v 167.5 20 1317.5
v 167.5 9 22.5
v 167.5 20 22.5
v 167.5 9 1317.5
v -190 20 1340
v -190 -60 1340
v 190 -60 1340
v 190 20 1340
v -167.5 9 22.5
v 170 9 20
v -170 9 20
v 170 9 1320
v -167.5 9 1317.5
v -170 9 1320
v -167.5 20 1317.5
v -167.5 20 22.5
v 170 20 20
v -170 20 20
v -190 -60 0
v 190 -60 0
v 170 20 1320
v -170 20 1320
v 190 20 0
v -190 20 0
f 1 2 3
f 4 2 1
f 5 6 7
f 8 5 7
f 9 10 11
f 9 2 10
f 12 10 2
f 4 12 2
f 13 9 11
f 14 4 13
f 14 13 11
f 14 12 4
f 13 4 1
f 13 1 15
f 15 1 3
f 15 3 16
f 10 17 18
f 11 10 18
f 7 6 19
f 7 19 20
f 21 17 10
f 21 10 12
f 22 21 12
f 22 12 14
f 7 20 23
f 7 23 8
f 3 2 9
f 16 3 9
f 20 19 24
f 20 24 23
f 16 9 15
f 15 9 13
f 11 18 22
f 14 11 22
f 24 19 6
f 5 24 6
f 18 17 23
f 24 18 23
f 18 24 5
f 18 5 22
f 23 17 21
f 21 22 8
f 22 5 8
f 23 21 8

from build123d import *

# Parameters (mm, degrees)
SKETCH1_W           = 380
SKETCH1_H           = 1340
BOSS_EXTRUDE1_DEPTH = 80
SKETCH2_W           = 340
SKETCH2_H           = 1300
CUT_EXTRUDE1_DEPTH  = 11
SKETCH3_W           = 335
SKETCH3_H           = 1295
BOSS_EXTRUDE2_DEPTH = 11


with BuildPart() as part:
    # Sketch1 → Boss-Extrude1 (new body)
    with BuildSketch(Plane.XZ.offset(60)):
        with Locations((0, 670)):
            Rectangle(SKETCH1_W, SKETCH1_H)
    extrude(amount=-BOSS_EXTRUDE1_DEPTH)

    # Sketch2 → Cut-Extrude1 (cut)
    with BuildSketch(Plane(origin=(0, 20, 0), x_dir=(-1, 0, 0), z_dir=(0, 1, 0))):
        with Locations((0, 670)):
            Rectangle(SKETCH2_W, SKETCH2_H)
    extrude(amount=-CUT_EXTRUDE1_DEPTH, mode=Mode.SUBTRACT)

    # Sketch3 → Boss-Extrude2 (add)
    with BuildSketch(Plane(origin=(0, 9, 0), x_dir=(-1, 0, 0), z_dir=(0, 1, 0))):
        with Locations((0, 670)):
            Rectangle(SKETCH3_W, SKETCH3_H)
    extrude(amount=BOSS_EXTRUDE2_DEPTH)


solid = part.part
